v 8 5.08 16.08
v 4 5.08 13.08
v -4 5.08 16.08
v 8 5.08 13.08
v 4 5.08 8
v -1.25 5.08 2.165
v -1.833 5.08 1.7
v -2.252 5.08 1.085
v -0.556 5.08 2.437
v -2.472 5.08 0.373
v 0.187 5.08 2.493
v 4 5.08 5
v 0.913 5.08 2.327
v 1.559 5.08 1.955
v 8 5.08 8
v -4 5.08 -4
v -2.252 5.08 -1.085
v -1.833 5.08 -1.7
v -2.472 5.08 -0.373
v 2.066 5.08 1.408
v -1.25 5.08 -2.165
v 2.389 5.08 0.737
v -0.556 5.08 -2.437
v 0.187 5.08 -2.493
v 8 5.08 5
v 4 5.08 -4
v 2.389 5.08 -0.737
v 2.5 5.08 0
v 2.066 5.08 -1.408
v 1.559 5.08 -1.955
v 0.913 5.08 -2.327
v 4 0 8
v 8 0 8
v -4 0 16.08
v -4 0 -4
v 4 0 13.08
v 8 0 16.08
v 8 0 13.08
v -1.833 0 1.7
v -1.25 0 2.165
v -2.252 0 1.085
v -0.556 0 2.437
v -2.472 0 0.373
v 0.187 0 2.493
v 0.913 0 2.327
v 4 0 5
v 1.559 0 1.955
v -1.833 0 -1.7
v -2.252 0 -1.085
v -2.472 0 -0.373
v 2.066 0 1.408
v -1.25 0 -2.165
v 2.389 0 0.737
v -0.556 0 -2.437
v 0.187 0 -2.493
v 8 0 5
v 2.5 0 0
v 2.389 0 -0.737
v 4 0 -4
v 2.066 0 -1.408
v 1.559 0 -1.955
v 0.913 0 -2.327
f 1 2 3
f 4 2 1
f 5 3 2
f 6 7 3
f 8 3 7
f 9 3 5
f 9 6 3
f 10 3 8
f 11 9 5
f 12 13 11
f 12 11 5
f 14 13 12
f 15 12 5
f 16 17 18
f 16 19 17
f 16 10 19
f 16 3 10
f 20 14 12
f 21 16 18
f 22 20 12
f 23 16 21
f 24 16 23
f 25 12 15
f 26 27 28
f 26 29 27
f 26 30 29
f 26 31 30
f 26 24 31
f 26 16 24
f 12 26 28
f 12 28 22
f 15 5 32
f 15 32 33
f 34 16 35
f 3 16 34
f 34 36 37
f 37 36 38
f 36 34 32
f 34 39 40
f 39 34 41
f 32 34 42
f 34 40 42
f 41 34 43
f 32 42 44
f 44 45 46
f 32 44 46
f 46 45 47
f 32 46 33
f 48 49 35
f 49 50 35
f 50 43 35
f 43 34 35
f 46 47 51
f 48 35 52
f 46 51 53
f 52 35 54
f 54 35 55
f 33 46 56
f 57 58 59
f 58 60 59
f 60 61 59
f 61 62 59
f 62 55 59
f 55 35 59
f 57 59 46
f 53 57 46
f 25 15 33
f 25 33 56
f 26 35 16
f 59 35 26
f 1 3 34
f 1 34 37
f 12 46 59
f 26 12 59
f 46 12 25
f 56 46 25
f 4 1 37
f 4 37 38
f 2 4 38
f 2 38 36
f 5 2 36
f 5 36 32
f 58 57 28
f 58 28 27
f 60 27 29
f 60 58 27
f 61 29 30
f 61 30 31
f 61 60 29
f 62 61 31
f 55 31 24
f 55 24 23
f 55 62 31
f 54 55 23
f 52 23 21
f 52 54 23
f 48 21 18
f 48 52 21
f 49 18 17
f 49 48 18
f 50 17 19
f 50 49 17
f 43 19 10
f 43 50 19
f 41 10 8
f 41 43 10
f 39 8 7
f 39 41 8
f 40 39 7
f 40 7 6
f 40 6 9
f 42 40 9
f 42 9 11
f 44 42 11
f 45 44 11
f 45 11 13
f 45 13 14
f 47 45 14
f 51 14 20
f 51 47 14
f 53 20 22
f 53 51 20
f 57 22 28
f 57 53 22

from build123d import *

# Parameters (mm, degrees)
SKETCH1_W           = 8
SKETCH1_H           = 12
SKETCH1_R           = 2.5
BOSS_EXTRUDE1_DEPTH = 5.08
SKETCH2_W           = 4
SKETCH2_H           = 3
BOSS_EXTRUDE2_DEPTH = 5.08


with BuildPart() as part:
    # Sketch1 → Boss-Extrude1 (new body)
    with BuildSketch(Plane(origin=(0, 0, 0), x_dir=(1, 0, 0), z_dir=(0, 1, 0))):
        with Locations((0, -2)):
            Rectangle(SKETCH1_W, SKETCH1_H)
        Circle(SKETCH1_R, mode=Mode.SUBTRACT)
    extrude(amount=BOSS_EXTRUDE1_DEPTH)

    # Sketch2 → Boss-Extrude2 (add)
    with BuildSketch(Plane(origin=(0, 5.08, 0), x_dir=(1, 0, 0), z_dir=(0, 1, 0))):
        with Locations((6, -6.5)):
            Rectangle(SKETCH2_W, SKETCH2_H)
        Polygon((-4, -8), (-4, -16.08), (8, -16.08), (8, -13.08), (4, -13.08), (4, -8), align=None)
    extrude(amount=-BOSS_EXTRUDE2_DEPTH)


solid = part.part
